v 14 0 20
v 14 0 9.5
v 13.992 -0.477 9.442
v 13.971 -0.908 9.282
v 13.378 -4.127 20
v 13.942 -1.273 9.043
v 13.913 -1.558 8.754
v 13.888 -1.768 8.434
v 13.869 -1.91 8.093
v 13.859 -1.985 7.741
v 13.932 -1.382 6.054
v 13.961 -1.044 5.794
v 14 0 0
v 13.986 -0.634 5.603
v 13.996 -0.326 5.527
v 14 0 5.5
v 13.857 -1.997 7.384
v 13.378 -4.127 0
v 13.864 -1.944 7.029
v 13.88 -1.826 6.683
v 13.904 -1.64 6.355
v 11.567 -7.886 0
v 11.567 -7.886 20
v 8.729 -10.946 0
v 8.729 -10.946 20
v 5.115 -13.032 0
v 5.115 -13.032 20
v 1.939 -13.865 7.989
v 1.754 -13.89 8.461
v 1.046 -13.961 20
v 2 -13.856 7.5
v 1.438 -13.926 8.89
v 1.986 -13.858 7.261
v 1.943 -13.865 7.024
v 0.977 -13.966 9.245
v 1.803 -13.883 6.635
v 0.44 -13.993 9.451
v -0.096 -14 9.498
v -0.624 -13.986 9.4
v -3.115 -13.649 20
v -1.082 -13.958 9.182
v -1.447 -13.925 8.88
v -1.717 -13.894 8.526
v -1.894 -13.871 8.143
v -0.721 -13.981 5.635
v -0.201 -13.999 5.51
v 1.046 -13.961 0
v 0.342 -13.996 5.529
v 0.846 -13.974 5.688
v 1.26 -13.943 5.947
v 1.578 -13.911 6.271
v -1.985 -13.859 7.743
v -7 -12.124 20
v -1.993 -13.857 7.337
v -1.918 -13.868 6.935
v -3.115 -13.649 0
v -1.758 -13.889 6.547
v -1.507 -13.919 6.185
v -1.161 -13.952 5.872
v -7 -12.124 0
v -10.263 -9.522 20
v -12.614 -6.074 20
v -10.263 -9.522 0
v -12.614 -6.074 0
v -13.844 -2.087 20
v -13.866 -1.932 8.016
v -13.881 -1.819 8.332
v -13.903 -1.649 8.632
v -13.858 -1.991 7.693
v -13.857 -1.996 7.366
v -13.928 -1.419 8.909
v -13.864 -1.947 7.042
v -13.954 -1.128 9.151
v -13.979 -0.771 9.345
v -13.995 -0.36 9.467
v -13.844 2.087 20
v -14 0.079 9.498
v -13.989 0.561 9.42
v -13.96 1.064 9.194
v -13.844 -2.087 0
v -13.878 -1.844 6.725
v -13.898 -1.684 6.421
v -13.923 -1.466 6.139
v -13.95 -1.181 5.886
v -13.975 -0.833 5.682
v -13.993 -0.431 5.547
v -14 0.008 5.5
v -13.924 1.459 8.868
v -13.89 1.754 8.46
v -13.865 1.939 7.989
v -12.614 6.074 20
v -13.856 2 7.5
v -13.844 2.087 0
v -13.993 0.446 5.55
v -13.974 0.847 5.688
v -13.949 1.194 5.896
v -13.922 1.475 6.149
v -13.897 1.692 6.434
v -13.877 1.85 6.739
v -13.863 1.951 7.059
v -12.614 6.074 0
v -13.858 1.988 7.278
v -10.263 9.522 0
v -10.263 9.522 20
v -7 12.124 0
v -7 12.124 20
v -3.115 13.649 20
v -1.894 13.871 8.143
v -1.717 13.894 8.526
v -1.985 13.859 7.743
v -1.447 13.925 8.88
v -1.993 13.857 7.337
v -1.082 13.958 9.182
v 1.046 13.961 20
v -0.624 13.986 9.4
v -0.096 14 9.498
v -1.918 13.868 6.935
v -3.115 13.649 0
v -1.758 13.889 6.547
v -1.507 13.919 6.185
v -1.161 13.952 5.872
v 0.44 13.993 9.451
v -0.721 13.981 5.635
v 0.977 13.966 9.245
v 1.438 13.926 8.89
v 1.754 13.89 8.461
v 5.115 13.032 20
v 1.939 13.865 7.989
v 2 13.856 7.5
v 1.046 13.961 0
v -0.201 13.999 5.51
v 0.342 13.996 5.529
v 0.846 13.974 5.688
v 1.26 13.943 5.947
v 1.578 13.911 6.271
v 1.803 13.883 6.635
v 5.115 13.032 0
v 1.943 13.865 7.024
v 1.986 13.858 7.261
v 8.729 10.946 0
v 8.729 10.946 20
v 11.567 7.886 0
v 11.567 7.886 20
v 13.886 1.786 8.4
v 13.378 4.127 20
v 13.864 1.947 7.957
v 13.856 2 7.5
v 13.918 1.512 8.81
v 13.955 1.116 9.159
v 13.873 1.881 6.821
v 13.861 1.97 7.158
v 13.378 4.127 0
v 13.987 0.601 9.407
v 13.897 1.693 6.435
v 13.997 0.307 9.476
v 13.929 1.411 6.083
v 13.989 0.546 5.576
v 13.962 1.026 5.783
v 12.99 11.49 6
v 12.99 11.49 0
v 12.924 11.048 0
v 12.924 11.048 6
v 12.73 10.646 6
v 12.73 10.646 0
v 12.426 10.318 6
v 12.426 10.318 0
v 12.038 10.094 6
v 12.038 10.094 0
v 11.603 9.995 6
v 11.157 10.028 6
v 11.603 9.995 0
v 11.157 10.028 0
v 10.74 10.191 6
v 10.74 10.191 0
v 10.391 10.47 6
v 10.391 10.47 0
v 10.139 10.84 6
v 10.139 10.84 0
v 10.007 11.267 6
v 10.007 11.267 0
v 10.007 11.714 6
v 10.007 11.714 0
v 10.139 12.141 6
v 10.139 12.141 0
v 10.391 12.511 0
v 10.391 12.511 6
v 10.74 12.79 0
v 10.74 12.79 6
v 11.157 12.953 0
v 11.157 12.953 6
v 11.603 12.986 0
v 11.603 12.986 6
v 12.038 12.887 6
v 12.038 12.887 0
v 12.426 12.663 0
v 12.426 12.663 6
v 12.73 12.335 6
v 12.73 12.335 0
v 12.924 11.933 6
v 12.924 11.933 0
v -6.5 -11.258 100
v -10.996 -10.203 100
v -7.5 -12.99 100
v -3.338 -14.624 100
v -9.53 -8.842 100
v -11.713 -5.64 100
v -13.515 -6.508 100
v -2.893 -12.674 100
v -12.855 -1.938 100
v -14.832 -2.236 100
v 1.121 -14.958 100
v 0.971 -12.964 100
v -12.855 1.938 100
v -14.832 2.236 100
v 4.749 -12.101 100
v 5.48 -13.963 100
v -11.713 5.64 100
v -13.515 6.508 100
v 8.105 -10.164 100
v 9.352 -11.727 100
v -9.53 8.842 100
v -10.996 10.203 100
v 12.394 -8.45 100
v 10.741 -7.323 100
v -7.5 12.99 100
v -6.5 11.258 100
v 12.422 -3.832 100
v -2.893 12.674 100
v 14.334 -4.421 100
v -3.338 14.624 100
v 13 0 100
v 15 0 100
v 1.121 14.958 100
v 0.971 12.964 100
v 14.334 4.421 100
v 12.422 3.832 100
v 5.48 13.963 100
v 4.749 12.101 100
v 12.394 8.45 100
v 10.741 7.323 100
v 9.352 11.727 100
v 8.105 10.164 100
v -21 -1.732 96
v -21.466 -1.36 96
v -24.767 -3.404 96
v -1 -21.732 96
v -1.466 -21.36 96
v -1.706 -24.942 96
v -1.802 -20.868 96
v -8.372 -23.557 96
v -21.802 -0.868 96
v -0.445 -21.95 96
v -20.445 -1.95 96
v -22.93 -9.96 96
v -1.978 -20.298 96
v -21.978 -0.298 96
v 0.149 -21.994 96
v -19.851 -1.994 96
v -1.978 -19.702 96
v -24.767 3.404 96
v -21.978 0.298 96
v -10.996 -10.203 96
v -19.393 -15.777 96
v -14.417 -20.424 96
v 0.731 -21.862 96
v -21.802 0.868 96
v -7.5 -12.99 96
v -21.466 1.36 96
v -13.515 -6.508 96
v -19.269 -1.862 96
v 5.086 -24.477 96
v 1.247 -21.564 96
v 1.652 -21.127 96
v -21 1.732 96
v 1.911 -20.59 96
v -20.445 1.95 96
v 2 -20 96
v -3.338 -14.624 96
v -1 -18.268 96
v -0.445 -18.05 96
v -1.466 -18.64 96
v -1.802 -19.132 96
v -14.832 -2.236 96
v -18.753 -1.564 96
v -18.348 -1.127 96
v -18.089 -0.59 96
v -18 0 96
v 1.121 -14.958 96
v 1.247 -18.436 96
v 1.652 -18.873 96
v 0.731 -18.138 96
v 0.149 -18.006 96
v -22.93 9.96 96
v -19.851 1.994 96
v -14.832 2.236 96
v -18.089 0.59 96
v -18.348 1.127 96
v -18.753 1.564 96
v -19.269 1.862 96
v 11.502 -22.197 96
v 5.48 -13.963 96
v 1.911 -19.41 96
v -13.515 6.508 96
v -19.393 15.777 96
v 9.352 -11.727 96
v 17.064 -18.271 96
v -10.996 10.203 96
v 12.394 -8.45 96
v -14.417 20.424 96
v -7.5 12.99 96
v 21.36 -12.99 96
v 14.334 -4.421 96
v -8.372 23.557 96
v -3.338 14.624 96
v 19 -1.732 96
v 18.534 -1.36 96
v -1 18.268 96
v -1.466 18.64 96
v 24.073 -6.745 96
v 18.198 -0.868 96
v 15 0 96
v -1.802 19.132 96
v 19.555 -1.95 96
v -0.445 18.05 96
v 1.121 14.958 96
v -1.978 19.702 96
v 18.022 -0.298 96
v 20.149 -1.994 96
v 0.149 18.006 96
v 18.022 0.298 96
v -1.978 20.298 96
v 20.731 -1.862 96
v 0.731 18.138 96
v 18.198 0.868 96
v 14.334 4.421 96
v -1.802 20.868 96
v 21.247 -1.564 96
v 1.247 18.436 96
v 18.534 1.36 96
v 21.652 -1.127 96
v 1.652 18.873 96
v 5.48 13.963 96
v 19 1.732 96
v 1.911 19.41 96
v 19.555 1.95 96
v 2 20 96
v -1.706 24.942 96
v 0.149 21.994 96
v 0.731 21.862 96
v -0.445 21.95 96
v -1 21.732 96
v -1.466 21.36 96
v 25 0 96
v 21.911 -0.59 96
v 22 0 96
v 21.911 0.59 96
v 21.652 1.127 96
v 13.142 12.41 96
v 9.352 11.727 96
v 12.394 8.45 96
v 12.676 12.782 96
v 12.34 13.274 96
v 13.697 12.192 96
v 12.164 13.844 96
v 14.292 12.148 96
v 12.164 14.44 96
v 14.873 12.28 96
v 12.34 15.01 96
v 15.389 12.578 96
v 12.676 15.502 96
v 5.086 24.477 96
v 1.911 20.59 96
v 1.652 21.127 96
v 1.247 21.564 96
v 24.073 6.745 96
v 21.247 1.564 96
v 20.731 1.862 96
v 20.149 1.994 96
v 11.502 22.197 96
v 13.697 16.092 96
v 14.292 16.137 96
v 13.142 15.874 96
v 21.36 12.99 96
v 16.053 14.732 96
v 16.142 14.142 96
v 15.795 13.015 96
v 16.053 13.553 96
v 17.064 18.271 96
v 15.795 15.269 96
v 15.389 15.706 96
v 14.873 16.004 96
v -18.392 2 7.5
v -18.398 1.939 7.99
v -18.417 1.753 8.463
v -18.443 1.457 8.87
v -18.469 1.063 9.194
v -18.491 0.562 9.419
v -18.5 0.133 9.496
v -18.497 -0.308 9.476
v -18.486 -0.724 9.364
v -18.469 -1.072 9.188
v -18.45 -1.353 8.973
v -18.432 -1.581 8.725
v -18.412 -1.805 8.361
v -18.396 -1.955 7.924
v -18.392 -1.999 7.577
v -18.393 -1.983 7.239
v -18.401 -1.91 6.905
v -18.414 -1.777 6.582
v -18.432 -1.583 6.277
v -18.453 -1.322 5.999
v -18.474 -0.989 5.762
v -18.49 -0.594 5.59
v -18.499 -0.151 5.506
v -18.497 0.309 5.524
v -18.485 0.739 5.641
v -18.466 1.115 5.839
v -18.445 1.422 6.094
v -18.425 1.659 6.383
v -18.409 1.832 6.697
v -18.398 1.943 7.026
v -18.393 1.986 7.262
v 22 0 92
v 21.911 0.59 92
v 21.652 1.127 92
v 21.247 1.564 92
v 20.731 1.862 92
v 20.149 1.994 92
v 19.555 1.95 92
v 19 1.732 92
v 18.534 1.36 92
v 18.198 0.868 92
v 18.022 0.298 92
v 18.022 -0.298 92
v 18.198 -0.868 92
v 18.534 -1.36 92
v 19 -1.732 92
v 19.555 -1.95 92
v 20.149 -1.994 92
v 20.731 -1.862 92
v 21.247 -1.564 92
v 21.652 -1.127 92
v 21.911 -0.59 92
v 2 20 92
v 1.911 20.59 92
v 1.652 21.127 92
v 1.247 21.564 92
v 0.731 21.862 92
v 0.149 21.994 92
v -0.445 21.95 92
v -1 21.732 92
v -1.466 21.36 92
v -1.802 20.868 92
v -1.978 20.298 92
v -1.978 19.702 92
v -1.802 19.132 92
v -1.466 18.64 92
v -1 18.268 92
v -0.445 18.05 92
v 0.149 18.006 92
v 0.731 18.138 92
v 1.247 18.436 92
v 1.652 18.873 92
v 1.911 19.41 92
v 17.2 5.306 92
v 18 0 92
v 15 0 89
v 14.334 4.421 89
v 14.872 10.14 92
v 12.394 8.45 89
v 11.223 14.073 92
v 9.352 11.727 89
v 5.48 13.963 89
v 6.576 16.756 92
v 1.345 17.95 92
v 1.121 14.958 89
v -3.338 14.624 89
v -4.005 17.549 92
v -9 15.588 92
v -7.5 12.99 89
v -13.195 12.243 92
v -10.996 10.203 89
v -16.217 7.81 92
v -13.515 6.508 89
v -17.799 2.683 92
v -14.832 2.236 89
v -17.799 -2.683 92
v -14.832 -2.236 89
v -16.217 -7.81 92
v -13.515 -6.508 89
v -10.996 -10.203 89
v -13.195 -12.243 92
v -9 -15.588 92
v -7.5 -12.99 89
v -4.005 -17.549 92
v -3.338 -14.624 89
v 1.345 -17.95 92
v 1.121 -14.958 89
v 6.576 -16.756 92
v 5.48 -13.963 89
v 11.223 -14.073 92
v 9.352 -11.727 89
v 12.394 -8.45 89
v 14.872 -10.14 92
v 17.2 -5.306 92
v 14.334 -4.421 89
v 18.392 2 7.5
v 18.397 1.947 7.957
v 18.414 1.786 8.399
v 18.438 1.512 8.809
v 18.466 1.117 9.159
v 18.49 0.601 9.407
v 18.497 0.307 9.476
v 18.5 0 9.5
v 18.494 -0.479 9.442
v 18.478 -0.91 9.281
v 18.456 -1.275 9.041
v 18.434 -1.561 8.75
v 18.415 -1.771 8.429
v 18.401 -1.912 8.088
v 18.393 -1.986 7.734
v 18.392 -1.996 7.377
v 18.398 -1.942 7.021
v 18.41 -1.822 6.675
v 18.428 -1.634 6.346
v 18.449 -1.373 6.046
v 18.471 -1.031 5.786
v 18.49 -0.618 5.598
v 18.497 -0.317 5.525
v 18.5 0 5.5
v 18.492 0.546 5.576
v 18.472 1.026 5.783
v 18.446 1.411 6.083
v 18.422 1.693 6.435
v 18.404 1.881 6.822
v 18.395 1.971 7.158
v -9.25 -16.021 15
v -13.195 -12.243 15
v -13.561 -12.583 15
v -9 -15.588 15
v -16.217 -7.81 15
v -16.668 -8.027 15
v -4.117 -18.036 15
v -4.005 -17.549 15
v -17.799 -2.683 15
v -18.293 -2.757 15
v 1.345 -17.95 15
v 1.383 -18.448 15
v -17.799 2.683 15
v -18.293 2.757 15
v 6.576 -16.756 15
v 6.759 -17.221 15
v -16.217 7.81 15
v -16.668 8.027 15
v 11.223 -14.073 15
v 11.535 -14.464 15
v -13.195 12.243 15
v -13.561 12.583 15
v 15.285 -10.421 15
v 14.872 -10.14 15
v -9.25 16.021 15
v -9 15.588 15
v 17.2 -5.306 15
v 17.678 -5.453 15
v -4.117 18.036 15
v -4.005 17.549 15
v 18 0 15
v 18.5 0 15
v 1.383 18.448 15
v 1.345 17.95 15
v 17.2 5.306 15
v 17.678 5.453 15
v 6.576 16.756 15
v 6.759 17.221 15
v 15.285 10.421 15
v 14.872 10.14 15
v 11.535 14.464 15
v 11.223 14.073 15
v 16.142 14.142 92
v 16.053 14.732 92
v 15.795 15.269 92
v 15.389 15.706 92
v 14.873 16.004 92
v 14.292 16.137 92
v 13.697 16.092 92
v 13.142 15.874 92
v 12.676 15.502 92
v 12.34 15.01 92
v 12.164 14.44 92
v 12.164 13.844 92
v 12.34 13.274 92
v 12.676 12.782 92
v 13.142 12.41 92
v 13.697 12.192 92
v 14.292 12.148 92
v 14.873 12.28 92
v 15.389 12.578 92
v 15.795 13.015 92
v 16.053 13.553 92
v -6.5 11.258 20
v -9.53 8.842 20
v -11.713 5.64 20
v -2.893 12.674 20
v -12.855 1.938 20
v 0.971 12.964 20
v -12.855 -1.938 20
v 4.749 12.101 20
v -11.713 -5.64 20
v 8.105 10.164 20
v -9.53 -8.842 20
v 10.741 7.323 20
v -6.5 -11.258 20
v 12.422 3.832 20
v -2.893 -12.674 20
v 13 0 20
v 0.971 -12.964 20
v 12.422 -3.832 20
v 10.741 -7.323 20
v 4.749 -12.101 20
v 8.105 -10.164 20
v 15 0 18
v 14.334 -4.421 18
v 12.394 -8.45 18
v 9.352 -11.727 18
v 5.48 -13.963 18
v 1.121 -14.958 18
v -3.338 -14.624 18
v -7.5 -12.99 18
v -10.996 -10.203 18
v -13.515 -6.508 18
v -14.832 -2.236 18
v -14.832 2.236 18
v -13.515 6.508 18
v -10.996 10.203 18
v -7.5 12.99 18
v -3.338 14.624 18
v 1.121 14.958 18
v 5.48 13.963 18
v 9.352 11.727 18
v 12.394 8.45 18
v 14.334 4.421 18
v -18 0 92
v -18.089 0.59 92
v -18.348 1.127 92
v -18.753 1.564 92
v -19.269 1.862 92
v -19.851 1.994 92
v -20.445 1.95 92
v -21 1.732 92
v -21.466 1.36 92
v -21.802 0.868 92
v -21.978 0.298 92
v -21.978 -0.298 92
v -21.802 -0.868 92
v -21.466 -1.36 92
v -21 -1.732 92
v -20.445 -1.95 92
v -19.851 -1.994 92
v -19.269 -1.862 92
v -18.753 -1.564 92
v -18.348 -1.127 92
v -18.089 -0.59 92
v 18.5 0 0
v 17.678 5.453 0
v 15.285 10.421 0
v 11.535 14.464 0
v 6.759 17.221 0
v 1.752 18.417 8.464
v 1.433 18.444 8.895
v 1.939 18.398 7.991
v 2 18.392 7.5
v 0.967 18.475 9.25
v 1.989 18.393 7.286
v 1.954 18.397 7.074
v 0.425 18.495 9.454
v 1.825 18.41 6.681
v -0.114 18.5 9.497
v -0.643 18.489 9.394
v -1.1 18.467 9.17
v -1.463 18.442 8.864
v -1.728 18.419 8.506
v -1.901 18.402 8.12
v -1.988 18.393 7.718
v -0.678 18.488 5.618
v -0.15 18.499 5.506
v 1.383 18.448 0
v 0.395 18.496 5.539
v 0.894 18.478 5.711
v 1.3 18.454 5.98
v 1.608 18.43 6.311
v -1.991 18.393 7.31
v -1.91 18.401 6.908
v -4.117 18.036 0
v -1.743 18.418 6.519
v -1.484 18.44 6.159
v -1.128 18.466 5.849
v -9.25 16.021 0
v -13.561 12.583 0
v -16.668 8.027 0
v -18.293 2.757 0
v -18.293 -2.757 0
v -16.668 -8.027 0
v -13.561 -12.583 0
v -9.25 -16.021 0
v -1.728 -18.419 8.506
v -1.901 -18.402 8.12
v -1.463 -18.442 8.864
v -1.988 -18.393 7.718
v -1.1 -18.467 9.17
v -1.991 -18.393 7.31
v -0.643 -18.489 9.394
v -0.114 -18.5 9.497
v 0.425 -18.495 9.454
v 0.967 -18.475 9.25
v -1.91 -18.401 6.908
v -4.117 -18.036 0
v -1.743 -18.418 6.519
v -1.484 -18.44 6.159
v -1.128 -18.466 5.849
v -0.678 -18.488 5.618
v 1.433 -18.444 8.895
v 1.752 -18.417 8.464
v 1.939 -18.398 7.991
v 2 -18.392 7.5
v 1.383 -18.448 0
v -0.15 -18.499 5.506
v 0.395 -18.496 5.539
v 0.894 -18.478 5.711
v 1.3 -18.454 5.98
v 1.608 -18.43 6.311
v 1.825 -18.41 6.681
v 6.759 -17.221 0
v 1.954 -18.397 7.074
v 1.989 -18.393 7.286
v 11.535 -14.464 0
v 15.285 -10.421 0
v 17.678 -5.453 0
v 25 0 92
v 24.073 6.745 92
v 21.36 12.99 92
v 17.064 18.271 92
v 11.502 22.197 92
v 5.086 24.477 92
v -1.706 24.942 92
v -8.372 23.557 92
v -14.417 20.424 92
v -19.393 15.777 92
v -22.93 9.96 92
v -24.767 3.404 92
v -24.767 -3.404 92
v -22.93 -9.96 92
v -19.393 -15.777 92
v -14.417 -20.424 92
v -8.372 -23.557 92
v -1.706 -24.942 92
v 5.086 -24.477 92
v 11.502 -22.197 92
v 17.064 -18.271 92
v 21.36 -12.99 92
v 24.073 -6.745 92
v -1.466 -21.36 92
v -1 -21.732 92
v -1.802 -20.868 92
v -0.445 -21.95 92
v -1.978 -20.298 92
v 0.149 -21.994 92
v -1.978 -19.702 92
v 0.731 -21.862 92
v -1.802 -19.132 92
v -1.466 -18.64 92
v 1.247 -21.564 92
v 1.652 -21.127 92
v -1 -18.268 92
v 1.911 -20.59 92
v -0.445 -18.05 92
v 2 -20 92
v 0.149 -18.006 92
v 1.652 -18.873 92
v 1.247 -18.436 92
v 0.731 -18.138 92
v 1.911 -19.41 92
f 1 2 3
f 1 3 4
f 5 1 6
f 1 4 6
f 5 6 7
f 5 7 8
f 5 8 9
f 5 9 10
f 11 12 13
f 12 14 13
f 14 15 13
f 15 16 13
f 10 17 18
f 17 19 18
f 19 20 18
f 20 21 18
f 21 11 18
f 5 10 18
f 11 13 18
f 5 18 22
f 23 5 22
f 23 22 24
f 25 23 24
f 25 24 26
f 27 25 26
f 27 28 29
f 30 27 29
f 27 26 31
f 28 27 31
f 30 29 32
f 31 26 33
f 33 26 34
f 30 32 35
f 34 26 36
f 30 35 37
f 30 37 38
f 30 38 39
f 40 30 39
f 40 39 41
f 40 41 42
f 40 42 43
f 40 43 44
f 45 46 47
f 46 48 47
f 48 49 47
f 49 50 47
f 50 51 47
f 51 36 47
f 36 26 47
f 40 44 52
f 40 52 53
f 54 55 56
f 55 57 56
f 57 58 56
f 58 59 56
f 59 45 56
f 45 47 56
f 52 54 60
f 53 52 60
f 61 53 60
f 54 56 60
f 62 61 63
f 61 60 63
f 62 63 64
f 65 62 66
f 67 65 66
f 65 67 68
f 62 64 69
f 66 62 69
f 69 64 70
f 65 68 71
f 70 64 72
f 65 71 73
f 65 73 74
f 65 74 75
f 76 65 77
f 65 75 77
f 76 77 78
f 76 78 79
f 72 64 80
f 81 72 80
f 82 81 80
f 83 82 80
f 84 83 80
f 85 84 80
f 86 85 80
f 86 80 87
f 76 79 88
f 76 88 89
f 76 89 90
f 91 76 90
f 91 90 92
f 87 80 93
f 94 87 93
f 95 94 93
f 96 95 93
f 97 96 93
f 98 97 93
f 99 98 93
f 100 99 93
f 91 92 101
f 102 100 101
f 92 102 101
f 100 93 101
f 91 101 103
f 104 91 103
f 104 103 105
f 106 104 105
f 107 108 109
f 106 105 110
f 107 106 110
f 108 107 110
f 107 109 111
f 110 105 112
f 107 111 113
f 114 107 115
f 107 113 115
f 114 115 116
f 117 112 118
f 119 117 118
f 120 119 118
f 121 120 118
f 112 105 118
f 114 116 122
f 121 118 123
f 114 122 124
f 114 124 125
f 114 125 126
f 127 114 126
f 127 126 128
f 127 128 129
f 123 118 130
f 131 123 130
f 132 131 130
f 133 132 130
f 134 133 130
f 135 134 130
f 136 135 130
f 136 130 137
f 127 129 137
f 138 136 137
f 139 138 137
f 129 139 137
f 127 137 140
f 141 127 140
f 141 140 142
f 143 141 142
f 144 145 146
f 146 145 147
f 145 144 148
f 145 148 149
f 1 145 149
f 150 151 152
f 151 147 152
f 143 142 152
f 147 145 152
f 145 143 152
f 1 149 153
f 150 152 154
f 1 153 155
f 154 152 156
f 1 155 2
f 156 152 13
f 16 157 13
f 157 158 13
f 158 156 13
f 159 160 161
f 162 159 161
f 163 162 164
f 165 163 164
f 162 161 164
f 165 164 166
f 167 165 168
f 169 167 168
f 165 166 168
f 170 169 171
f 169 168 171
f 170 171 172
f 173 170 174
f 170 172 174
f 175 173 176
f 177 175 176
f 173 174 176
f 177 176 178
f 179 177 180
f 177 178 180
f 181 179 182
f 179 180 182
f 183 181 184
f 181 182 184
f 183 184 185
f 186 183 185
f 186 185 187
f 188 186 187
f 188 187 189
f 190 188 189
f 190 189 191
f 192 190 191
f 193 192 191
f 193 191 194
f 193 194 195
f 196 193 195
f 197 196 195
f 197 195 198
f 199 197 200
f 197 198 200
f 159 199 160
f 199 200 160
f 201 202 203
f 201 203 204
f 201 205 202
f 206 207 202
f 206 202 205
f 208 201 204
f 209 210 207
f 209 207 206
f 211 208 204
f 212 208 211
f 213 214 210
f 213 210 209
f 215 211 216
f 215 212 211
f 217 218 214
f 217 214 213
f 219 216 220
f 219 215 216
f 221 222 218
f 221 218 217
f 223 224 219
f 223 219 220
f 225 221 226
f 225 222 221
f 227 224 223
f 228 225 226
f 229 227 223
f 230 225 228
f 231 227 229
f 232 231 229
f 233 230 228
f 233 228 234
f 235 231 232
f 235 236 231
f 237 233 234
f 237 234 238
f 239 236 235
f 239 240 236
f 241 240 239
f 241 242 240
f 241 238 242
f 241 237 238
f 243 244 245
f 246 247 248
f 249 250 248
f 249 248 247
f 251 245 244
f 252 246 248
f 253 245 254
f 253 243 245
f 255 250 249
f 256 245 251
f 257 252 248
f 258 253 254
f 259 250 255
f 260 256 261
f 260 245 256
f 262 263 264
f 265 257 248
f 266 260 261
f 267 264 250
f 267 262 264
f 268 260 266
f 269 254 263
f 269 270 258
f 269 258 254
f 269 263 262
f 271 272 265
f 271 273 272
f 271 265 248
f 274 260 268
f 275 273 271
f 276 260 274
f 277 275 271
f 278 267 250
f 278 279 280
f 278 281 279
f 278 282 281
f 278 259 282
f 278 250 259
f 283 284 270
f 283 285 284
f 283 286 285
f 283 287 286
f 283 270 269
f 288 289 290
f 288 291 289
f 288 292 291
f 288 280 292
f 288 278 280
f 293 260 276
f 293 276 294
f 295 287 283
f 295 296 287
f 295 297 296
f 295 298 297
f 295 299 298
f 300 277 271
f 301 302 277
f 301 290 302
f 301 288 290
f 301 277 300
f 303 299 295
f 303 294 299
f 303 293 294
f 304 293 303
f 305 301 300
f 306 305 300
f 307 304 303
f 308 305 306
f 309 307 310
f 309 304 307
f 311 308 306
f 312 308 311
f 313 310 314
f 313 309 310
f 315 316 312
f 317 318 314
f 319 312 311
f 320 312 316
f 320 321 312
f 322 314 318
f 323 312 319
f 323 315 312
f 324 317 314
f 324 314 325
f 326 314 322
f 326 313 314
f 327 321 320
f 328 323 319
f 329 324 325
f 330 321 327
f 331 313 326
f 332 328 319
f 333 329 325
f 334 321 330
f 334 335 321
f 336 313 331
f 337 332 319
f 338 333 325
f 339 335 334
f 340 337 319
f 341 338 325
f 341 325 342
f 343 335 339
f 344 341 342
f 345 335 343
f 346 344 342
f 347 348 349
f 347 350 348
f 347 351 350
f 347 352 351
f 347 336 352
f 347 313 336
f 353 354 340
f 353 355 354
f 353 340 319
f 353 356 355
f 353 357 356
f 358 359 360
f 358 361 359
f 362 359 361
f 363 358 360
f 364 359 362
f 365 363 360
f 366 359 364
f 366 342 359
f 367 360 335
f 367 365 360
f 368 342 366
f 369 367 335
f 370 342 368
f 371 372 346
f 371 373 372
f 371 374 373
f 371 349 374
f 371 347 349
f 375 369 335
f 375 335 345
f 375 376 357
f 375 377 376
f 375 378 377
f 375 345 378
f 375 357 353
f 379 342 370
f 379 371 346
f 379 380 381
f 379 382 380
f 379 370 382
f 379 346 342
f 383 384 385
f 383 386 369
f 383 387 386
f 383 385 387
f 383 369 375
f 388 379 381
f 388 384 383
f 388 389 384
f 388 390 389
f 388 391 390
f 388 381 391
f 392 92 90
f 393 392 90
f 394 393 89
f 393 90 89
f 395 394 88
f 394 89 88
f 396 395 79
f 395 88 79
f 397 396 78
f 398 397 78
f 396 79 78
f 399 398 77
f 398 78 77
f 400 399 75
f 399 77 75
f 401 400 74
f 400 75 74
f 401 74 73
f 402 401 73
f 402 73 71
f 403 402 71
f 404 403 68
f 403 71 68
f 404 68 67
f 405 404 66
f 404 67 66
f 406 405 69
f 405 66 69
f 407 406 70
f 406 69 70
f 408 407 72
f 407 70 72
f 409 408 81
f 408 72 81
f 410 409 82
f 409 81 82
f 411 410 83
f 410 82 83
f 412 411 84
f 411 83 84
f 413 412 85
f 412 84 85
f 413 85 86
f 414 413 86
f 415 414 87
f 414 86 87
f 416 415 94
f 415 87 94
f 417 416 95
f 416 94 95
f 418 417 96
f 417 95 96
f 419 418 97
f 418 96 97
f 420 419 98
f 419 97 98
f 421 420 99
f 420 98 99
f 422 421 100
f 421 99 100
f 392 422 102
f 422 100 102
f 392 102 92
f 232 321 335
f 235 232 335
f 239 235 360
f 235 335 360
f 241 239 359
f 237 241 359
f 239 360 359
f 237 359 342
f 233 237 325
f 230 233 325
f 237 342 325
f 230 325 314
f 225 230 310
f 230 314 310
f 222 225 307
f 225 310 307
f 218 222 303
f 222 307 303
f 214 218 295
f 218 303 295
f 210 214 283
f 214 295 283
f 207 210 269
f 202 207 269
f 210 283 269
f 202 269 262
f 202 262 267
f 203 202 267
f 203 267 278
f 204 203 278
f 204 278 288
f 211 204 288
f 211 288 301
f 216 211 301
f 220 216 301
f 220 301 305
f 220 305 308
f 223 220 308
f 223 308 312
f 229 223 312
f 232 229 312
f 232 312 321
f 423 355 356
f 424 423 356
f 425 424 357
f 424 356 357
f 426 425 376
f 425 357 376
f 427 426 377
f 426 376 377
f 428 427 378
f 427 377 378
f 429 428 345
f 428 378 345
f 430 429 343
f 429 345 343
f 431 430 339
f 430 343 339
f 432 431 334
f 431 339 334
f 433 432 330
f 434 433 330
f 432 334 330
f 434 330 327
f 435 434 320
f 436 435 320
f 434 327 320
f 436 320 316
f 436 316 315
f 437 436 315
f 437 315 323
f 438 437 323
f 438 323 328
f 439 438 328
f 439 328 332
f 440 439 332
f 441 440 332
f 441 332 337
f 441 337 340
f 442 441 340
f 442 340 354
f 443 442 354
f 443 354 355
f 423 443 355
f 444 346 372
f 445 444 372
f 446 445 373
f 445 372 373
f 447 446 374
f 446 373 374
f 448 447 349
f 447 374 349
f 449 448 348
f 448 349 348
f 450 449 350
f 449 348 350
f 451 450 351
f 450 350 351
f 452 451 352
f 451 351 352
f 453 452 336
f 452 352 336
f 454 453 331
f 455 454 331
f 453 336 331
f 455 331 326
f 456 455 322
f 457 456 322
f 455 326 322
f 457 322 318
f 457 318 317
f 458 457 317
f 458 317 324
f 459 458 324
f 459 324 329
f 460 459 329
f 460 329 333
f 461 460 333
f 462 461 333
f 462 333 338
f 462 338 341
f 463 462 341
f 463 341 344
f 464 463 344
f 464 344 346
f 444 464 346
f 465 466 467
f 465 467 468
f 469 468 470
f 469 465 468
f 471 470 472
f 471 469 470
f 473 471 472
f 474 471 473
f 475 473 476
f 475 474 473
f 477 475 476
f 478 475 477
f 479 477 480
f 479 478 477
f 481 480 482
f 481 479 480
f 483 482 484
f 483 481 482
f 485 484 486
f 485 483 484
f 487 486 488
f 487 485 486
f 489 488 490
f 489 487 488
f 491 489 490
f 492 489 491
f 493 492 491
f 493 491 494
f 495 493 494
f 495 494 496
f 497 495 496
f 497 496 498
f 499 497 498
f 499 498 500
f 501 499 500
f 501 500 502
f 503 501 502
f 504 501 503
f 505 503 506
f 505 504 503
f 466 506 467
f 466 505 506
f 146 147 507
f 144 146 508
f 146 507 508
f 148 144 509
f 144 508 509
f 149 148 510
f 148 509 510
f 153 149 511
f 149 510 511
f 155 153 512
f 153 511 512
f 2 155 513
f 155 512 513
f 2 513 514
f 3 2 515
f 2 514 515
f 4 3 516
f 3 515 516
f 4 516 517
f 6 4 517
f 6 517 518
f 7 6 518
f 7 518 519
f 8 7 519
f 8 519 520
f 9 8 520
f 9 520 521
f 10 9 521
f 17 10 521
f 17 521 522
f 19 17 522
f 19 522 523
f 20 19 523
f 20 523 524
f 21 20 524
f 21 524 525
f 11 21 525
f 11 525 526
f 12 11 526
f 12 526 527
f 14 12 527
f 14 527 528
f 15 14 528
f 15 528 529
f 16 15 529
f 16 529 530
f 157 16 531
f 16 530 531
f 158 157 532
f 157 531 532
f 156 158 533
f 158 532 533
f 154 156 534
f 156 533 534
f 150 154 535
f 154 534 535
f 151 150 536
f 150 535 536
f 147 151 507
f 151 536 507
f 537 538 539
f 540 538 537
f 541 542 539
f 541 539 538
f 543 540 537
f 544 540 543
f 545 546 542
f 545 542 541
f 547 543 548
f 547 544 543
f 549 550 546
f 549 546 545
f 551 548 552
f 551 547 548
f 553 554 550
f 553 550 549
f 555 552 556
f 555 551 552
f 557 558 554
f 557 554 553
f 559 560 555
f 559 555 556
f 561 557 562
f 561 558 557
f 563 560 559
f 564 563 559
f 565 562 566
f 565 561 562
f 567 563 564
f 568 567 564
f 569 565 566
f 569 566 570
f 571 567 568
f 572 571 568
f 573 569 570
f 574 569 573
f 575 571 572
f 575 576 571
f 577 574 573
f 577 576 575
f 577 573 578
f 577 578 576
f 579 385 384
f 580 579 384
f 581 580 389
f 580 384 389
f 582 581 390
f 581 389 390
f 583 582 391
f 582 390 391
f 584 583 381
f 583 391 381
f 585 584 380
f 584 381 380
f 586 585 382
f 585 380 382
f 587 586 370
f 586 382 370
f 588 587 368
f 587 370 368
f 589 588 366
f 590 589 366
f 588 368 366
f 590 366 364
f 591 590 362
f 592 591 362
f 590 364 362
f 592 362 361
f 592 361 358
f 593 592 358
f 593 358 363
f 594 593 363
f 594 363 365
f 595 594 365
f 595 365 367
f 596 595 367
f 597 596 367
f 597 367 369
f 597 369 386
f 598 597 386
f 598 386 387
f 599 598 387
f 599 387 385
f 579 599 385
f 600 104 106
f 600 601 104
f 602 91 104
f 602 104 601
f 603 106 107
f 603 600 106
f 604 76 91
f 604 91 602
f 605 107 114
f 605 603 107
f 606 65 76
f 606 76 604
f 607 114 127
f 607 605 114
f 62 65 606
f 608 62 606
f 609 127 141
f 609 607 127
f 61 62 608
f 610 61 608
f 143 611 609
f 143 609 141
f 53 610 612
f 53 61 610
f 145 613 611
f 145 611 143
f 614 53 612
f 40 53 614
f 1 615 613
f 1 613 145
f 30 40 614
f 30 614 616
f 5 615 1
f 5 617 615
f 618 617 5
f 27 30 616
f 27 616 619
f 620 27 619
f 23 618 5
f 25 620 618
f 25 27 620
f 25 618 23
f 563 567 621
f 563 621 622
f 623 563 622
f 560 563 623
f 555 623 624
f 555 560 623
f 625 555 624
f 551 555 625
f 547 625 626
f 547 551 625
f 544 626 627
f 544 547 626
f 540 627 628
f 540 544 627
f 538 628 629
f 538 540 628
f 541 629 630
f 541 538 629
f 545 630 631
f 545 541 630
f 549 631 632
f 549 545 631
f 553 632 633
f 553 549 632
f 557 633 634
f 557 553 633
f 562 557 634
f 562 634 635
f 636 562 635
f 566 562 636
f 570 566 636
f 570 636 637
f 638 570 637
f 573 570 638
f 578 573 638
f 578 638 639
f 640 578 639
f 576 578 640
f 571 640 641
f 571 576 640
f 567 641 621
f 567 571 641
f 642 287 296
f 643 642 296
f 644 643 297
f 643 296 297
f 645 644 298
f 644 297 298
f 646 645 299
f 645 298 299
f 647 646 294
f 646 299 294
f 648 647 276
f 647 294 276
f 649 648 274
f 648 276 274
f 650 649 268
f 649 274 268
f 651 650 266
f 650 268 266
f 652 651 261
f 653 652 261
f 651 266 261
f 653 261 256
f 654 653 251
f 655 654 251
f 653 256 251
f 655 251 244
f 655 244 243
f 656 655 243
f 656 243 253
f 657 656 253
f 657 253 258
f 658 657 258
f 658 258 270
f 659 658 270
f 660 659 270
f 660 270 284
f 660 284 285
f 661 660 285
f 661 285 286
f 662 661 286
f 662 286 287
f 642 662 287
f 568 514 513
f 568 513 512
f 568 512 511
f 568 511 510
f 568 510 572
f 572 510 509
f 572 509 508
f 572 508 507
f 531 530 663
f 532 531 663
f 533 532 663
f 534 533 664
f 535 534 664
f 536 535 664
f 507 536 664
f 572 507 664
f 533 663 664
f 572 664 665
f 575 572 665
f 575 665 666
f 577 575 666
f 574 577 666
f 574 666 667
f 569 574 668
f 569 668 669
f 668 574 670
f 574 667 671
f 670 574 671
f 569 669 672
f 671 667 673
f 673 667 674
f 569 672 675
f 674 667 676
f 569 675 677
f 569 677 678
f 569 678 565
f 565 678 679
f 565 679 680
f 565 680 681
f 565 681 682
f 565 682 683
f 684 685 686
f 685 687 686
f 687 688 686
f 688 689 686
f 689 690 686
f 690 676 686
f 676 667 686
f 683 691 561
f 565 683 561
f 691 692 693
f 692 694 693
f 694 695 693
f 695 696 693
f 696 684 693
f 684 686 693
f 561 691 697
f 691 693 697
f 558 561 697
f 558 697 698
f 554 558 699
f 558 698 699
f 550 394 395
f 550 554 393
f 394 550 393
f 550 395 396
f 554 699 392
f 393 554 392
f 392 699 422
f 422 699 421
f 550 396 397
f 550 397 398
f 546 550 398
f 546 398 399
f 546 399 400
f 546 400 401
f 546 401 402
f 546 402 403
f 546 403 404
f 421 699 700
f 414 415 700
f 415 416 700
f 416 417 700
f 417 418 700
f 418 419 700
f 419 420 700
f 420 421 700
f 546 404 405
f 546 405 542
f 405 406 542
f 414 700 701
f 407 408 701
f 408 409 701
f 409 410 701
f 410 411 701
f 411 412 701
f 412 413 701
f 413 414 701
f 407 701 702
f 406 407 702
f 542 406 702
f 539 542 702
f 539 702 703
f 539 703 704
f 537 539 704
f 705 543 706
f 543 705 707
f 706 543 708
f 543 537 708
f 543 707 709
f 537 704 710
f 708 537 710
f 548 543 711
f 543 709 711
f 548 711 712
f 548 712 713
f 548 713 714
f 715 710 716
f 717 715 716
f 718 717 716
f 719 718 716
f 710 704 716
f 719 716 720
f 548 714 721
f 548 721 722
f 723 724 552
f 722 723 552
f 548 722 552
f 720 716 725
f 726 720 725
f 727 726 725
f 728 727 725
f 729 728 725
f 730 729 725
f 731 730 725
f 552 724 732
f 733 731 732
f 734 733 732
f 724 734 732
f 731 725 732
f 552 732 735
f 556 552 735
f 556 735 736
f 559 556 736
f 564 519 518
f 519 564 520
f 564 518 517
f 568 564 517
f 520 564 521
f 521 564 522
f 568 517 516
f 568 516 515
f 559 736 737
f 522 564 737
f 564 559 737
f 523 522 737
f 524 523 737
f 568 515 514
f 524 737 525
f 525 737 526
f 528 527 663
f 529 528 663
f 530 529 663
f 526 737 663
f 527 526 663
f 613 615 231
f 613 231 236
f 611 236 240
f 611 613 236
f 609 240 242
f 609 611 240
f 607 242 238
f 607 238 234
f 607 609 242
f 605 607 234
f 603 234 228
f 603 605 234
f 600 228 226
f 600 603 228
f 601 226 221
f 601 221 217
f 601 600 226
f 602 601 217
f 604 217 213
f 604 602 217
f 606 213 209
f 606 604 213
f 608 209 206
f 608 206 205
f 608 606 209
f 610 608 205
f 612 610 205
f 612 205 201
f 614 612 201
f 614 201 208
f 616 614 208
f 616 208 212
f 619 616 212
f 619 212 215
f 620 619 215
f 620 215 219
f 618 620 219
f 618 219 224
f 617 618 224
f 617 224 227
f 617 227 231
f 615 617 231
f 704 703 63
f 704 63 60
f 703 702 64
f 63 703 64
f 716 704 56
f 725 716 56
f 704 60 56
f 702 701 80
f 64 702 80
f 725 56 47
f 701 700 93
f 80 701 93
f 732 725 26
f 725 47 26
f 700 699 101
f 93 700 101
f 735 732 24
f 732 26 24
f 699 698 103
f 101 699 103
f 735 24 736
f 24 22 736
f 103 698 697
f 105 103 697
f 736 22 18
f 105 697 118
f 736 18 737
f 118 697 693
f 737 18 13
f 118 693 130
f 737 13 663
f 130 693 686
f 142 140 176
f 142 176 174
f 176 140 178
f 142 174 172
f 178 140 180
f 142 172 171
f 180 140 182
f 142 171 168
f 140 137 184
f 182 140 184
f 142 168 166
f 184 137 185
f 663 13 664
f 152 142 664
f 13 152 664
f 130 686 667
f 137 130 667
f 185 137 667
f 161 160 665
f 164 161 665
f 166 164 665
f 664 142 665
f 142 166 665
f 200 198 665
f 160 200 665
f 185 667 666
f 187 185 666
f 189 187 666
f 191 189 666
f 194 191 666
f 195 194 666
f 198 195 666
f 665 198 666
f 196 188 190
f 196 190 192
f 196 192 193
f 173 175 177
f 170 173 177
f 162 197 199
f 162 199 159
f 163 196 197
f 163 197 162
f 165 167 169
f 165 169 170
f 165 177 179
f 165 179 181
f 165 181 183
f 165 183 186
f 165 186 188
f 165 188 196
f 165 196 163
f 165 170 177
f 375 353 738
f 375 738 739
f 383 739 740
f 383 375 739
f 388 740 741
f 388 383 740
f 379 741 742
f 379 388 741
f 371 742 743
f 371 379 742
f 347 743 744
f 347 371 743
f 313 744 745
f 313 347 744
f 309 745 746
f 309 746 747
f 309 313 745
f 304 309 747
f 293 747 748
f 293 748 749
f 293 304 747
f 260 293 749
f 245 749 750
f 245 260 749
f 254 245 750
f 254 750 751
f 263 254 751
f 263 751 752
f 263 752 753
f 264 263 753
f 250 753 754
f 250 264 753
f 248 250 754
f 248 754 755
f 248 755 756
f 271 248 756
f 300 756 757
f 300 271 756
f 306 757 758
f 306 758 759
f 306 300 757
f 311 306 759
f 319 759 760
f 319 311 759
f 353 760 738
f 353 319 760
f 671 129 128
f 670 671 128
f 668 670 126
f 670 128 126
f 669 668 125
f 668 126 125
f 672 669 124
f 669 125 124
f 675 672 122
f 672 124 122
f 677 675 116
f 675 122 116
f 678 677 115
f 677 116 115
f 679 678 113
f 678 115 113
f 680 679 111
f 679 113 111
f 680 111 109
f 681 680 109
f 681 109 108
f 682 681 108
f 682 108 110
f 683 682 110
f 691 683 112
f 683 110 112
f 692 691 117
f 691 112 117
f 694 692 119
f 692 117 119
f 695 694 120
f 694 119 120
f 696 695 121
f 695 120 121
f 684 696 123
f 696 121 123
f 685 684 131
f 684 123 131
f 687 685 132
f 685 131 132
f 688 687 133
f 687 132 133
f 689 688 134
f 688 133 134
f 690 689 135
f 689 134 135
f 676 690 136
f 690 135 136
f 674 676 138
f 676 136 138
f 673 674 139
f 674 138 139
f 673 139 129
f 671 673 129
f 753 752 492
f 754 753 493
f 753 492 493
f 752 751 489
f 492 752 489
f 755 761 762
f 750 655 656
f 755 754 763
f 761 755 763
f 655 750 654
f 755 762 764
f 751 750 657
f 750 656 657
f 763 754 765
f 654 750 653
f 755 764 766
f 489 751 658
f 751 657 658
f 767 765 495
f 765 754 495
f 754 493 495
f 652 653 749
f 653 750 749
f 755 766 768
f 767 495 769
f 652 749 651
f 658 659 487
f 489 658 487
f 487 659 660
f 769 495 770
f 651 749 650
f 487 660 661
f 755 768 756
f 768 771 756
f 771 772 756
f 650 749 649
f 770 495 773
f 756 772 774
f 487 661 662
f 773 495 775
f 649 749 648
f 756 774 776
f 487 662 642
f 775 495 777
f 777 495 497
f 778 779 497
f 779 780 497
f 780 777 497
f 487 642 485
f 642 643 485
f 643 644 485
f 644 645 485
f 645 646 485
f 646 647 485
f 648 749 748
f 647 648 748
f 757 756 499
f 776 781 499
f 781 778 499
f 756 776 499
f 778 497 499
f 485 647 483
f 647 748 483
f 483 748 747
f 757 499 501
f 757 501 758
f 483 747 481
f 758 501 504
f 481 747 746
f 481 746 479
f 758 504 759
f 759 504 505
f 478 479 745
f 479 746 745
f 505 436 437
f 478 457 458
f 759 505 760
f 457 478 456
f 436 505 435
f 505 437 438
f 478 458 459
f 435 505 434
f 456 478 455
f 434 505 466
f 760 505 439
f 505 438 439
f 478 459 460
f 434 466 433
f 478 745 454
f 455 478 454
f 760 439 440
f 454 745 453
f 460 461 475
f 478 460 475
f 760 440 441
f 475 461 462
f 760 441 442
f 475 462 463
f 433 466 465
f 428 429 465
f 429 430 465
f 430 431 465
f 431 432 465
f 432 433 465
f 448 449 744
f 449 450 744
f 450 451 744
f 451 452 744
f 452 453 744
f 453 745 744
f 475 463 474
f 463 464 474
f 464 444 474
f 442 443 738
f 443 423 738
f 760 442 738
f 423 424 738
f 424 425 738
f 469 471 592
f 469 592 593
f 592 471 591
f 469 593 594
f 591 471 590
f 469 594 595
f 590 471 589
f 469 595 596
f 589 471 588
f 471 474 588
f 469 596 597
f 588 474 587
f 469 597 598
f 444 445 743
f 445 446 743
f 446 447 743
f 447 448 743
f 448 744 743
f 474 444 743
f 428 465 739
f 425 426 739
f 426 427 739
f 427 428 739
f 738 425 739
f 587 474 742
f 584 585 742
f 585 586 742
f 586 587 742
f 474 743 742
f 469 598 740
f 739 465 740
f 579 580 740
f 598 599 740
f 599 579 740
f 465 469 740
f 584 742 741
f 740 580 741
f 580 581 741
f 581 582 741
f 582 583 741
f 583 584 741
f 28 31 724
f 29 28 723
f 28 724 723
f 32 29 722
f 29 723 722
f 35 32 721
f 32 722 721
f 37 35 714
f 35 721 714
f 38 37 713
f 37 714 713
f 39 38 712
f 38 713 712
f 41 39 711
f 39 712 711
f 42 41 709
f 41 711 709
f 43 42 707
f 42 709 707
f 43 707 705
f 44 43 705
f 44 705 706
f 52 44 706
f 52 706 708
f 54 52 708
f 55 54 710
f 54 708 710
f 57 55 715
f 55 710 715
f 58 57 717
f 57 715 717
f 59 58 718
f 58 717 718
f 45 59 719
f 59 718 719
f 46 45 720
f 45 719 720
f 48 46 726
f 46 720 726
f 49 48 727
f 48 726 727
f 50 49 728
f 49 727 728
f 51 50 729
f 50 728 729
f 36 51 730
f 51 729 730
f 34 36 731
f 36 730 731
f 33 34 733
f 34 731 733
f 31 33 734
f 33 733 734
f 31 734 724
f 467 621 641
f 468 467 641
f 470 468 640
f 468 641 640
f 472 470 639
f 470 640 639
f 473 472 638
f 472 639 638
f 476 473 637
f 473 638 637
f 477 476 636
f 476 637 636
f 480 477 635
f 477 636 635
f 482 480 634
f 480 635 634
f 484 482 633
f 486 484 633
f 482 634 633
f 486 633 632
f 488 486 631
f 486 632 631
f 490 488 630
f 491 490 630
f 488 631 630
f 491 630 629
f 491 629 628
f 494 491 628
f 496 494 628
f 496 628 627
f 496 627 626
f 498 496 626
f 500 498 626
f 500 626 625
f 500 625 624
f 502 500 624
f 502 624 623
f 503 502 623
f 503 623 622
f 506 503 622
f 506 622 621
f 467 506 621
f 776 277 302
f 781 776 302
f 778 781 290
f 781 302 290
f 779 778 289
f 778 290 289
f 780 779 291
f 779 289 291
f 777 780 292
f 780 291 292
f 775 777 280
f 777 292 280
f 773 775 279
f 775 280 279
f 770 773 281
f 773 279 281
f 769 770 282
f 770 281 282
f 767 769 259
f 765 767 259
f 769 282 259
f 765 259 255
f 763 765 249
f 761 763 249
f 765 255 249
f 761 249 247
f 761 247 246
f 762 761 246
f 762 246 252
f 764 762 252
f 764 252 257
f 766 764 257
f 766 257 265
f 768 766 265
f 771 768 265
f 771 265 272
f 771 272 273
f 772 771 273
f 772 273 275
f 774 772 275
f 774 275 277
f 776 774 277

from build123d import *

# Parameters (mm, degrees)
F0_R      = 15
F0_R_2    = 13
F1_DEPTH  = 100
F3_R      = 25
F3_R_2    = 15
F4_DEPTH  = 4
F5_R      = 2
F6_DEPTH  = 96.001
F7_R      = 18.5
F7_R_2    = 13
F8_DEPTH  = 15
F9_R      = 2
F10_DEPTH = 50
F11_R     = 2
F12_DEPTH = 50
F13_SIZE  = 2.99999
F14_SIZE  = 3
F15_R     = 14
F16_DEPTH = 20
F17_R     = 2
F18_DEPTH = 25
F19_R     = 1.5
F20_DEPTH = 6


# Not quite as in the source:
# - a fillet or chamfer is up to 0.001 mm smaller than in the source, because OpenCascade refuses the exact size


with BuildPart() as f1:
    # F0 (on Top) → F1 (new body)
    with BuildSketch(Plane.XY):
        Circle(F0_R)
        Circle(F0_R_2, mode=Mode.SUBTRACT)
    extrude(amount=F1_DEPTH)

    # F3 (on offset) → F4 (join)
    with BuildSketch(Plane.XY.offset(96)):
        Circle(F3_R)
        Circle(F3_R_2, mode=Mode.SUBTRACT)
    extrude(amount=-F4_DEPTH)

    # F5 (on face) → F6 (cut, through all)
    with BuildSketch(Plane.XY.offset(96)):
        with Locations((0, 20)):
            Circle(F5_R)
        with Locations((-20, 0)):
            Circle(F5_R)
        with Locations((0, -20)):
            Circle(F5_R)
        with Locations((20, 0)):
            Circle(F5_R)
    extrude(amount=-F6_DEPTH, mode=Mode.SUBTRACT)

    # F7 (on Top) → F8 (join)
    with BuildSketch(Plane.XY):
        Circle(F7_R)
        Circle(F7_R_2, mode=Mode.SUBTRACT)
    extrude(amount=F8_DEPTH)

    # F9 (on Right) → F10 (cut, symmetric)
    with BuildSketch(Plane.YZ):
        with Locations((0, 7.5)):
            Circle(F9_R)
    extrude(amount=F10_DEPTH, both=True, mode=Mode.SUBTRACT)

    # F11 (on Front) → F12 (cut, symmetric)
    with BuildSketch(Plane.XZ):
        with Locations((0, 7.5)):
            Circle(F11_R)
    extrude(amount=F12_DEPTH, both=True, mode=Mode.SUBTRACT)

    # F13 (size 3 in the source; OpenCascade refuses exactly that, so slightly less here)
    f13_edges = [f1.edges().sort_by_distance(p)[0] for p in [
        (-15, 0, 92),
    ]]
    chamfer(f13_edges, length=F13_SIZE)

    # F14
    f14_edges = [f1.edges().sort_by_distance(p)[0] for p in [
        (-15, 0, 15),
    ]]
    chamfer(f14_edges, length=F14_SIZE)

    # F15 (on face) → F16 (cut)
    with BuildSketch(Plane(origin=(0, 0, 0), x_dir=(1, 0, 0), z_dir=(0, 0, -1))):
        Circle(F15_R)
    extrude(amount=-F16_DEPTH, mode=Mode.SUBTRACT)

    # F17 (on face) → F18 (cut)
    with BuildSketch(Plane.XY.offset(96)):
        with Locations((14.1421356237, 14.1421356237)):
            Circle(F17_R)
    extrude(amount=-F18_DEPTH, mode=Mode.SUBTRACT)

    # F19 (on face) → F20 (cut)
    with BuildSketch(Plane(origin=(0, 0, 0), x_dir=(1, 0, 0), z_dir=(0, 0, -1))):
        with Locations((11.4904851943, -11.4904851943)):
            Circle(F19_R)
    extrude(amount=-F20_DEPTH, mode=Mode.SUBTRACT)


solid = f1.part
